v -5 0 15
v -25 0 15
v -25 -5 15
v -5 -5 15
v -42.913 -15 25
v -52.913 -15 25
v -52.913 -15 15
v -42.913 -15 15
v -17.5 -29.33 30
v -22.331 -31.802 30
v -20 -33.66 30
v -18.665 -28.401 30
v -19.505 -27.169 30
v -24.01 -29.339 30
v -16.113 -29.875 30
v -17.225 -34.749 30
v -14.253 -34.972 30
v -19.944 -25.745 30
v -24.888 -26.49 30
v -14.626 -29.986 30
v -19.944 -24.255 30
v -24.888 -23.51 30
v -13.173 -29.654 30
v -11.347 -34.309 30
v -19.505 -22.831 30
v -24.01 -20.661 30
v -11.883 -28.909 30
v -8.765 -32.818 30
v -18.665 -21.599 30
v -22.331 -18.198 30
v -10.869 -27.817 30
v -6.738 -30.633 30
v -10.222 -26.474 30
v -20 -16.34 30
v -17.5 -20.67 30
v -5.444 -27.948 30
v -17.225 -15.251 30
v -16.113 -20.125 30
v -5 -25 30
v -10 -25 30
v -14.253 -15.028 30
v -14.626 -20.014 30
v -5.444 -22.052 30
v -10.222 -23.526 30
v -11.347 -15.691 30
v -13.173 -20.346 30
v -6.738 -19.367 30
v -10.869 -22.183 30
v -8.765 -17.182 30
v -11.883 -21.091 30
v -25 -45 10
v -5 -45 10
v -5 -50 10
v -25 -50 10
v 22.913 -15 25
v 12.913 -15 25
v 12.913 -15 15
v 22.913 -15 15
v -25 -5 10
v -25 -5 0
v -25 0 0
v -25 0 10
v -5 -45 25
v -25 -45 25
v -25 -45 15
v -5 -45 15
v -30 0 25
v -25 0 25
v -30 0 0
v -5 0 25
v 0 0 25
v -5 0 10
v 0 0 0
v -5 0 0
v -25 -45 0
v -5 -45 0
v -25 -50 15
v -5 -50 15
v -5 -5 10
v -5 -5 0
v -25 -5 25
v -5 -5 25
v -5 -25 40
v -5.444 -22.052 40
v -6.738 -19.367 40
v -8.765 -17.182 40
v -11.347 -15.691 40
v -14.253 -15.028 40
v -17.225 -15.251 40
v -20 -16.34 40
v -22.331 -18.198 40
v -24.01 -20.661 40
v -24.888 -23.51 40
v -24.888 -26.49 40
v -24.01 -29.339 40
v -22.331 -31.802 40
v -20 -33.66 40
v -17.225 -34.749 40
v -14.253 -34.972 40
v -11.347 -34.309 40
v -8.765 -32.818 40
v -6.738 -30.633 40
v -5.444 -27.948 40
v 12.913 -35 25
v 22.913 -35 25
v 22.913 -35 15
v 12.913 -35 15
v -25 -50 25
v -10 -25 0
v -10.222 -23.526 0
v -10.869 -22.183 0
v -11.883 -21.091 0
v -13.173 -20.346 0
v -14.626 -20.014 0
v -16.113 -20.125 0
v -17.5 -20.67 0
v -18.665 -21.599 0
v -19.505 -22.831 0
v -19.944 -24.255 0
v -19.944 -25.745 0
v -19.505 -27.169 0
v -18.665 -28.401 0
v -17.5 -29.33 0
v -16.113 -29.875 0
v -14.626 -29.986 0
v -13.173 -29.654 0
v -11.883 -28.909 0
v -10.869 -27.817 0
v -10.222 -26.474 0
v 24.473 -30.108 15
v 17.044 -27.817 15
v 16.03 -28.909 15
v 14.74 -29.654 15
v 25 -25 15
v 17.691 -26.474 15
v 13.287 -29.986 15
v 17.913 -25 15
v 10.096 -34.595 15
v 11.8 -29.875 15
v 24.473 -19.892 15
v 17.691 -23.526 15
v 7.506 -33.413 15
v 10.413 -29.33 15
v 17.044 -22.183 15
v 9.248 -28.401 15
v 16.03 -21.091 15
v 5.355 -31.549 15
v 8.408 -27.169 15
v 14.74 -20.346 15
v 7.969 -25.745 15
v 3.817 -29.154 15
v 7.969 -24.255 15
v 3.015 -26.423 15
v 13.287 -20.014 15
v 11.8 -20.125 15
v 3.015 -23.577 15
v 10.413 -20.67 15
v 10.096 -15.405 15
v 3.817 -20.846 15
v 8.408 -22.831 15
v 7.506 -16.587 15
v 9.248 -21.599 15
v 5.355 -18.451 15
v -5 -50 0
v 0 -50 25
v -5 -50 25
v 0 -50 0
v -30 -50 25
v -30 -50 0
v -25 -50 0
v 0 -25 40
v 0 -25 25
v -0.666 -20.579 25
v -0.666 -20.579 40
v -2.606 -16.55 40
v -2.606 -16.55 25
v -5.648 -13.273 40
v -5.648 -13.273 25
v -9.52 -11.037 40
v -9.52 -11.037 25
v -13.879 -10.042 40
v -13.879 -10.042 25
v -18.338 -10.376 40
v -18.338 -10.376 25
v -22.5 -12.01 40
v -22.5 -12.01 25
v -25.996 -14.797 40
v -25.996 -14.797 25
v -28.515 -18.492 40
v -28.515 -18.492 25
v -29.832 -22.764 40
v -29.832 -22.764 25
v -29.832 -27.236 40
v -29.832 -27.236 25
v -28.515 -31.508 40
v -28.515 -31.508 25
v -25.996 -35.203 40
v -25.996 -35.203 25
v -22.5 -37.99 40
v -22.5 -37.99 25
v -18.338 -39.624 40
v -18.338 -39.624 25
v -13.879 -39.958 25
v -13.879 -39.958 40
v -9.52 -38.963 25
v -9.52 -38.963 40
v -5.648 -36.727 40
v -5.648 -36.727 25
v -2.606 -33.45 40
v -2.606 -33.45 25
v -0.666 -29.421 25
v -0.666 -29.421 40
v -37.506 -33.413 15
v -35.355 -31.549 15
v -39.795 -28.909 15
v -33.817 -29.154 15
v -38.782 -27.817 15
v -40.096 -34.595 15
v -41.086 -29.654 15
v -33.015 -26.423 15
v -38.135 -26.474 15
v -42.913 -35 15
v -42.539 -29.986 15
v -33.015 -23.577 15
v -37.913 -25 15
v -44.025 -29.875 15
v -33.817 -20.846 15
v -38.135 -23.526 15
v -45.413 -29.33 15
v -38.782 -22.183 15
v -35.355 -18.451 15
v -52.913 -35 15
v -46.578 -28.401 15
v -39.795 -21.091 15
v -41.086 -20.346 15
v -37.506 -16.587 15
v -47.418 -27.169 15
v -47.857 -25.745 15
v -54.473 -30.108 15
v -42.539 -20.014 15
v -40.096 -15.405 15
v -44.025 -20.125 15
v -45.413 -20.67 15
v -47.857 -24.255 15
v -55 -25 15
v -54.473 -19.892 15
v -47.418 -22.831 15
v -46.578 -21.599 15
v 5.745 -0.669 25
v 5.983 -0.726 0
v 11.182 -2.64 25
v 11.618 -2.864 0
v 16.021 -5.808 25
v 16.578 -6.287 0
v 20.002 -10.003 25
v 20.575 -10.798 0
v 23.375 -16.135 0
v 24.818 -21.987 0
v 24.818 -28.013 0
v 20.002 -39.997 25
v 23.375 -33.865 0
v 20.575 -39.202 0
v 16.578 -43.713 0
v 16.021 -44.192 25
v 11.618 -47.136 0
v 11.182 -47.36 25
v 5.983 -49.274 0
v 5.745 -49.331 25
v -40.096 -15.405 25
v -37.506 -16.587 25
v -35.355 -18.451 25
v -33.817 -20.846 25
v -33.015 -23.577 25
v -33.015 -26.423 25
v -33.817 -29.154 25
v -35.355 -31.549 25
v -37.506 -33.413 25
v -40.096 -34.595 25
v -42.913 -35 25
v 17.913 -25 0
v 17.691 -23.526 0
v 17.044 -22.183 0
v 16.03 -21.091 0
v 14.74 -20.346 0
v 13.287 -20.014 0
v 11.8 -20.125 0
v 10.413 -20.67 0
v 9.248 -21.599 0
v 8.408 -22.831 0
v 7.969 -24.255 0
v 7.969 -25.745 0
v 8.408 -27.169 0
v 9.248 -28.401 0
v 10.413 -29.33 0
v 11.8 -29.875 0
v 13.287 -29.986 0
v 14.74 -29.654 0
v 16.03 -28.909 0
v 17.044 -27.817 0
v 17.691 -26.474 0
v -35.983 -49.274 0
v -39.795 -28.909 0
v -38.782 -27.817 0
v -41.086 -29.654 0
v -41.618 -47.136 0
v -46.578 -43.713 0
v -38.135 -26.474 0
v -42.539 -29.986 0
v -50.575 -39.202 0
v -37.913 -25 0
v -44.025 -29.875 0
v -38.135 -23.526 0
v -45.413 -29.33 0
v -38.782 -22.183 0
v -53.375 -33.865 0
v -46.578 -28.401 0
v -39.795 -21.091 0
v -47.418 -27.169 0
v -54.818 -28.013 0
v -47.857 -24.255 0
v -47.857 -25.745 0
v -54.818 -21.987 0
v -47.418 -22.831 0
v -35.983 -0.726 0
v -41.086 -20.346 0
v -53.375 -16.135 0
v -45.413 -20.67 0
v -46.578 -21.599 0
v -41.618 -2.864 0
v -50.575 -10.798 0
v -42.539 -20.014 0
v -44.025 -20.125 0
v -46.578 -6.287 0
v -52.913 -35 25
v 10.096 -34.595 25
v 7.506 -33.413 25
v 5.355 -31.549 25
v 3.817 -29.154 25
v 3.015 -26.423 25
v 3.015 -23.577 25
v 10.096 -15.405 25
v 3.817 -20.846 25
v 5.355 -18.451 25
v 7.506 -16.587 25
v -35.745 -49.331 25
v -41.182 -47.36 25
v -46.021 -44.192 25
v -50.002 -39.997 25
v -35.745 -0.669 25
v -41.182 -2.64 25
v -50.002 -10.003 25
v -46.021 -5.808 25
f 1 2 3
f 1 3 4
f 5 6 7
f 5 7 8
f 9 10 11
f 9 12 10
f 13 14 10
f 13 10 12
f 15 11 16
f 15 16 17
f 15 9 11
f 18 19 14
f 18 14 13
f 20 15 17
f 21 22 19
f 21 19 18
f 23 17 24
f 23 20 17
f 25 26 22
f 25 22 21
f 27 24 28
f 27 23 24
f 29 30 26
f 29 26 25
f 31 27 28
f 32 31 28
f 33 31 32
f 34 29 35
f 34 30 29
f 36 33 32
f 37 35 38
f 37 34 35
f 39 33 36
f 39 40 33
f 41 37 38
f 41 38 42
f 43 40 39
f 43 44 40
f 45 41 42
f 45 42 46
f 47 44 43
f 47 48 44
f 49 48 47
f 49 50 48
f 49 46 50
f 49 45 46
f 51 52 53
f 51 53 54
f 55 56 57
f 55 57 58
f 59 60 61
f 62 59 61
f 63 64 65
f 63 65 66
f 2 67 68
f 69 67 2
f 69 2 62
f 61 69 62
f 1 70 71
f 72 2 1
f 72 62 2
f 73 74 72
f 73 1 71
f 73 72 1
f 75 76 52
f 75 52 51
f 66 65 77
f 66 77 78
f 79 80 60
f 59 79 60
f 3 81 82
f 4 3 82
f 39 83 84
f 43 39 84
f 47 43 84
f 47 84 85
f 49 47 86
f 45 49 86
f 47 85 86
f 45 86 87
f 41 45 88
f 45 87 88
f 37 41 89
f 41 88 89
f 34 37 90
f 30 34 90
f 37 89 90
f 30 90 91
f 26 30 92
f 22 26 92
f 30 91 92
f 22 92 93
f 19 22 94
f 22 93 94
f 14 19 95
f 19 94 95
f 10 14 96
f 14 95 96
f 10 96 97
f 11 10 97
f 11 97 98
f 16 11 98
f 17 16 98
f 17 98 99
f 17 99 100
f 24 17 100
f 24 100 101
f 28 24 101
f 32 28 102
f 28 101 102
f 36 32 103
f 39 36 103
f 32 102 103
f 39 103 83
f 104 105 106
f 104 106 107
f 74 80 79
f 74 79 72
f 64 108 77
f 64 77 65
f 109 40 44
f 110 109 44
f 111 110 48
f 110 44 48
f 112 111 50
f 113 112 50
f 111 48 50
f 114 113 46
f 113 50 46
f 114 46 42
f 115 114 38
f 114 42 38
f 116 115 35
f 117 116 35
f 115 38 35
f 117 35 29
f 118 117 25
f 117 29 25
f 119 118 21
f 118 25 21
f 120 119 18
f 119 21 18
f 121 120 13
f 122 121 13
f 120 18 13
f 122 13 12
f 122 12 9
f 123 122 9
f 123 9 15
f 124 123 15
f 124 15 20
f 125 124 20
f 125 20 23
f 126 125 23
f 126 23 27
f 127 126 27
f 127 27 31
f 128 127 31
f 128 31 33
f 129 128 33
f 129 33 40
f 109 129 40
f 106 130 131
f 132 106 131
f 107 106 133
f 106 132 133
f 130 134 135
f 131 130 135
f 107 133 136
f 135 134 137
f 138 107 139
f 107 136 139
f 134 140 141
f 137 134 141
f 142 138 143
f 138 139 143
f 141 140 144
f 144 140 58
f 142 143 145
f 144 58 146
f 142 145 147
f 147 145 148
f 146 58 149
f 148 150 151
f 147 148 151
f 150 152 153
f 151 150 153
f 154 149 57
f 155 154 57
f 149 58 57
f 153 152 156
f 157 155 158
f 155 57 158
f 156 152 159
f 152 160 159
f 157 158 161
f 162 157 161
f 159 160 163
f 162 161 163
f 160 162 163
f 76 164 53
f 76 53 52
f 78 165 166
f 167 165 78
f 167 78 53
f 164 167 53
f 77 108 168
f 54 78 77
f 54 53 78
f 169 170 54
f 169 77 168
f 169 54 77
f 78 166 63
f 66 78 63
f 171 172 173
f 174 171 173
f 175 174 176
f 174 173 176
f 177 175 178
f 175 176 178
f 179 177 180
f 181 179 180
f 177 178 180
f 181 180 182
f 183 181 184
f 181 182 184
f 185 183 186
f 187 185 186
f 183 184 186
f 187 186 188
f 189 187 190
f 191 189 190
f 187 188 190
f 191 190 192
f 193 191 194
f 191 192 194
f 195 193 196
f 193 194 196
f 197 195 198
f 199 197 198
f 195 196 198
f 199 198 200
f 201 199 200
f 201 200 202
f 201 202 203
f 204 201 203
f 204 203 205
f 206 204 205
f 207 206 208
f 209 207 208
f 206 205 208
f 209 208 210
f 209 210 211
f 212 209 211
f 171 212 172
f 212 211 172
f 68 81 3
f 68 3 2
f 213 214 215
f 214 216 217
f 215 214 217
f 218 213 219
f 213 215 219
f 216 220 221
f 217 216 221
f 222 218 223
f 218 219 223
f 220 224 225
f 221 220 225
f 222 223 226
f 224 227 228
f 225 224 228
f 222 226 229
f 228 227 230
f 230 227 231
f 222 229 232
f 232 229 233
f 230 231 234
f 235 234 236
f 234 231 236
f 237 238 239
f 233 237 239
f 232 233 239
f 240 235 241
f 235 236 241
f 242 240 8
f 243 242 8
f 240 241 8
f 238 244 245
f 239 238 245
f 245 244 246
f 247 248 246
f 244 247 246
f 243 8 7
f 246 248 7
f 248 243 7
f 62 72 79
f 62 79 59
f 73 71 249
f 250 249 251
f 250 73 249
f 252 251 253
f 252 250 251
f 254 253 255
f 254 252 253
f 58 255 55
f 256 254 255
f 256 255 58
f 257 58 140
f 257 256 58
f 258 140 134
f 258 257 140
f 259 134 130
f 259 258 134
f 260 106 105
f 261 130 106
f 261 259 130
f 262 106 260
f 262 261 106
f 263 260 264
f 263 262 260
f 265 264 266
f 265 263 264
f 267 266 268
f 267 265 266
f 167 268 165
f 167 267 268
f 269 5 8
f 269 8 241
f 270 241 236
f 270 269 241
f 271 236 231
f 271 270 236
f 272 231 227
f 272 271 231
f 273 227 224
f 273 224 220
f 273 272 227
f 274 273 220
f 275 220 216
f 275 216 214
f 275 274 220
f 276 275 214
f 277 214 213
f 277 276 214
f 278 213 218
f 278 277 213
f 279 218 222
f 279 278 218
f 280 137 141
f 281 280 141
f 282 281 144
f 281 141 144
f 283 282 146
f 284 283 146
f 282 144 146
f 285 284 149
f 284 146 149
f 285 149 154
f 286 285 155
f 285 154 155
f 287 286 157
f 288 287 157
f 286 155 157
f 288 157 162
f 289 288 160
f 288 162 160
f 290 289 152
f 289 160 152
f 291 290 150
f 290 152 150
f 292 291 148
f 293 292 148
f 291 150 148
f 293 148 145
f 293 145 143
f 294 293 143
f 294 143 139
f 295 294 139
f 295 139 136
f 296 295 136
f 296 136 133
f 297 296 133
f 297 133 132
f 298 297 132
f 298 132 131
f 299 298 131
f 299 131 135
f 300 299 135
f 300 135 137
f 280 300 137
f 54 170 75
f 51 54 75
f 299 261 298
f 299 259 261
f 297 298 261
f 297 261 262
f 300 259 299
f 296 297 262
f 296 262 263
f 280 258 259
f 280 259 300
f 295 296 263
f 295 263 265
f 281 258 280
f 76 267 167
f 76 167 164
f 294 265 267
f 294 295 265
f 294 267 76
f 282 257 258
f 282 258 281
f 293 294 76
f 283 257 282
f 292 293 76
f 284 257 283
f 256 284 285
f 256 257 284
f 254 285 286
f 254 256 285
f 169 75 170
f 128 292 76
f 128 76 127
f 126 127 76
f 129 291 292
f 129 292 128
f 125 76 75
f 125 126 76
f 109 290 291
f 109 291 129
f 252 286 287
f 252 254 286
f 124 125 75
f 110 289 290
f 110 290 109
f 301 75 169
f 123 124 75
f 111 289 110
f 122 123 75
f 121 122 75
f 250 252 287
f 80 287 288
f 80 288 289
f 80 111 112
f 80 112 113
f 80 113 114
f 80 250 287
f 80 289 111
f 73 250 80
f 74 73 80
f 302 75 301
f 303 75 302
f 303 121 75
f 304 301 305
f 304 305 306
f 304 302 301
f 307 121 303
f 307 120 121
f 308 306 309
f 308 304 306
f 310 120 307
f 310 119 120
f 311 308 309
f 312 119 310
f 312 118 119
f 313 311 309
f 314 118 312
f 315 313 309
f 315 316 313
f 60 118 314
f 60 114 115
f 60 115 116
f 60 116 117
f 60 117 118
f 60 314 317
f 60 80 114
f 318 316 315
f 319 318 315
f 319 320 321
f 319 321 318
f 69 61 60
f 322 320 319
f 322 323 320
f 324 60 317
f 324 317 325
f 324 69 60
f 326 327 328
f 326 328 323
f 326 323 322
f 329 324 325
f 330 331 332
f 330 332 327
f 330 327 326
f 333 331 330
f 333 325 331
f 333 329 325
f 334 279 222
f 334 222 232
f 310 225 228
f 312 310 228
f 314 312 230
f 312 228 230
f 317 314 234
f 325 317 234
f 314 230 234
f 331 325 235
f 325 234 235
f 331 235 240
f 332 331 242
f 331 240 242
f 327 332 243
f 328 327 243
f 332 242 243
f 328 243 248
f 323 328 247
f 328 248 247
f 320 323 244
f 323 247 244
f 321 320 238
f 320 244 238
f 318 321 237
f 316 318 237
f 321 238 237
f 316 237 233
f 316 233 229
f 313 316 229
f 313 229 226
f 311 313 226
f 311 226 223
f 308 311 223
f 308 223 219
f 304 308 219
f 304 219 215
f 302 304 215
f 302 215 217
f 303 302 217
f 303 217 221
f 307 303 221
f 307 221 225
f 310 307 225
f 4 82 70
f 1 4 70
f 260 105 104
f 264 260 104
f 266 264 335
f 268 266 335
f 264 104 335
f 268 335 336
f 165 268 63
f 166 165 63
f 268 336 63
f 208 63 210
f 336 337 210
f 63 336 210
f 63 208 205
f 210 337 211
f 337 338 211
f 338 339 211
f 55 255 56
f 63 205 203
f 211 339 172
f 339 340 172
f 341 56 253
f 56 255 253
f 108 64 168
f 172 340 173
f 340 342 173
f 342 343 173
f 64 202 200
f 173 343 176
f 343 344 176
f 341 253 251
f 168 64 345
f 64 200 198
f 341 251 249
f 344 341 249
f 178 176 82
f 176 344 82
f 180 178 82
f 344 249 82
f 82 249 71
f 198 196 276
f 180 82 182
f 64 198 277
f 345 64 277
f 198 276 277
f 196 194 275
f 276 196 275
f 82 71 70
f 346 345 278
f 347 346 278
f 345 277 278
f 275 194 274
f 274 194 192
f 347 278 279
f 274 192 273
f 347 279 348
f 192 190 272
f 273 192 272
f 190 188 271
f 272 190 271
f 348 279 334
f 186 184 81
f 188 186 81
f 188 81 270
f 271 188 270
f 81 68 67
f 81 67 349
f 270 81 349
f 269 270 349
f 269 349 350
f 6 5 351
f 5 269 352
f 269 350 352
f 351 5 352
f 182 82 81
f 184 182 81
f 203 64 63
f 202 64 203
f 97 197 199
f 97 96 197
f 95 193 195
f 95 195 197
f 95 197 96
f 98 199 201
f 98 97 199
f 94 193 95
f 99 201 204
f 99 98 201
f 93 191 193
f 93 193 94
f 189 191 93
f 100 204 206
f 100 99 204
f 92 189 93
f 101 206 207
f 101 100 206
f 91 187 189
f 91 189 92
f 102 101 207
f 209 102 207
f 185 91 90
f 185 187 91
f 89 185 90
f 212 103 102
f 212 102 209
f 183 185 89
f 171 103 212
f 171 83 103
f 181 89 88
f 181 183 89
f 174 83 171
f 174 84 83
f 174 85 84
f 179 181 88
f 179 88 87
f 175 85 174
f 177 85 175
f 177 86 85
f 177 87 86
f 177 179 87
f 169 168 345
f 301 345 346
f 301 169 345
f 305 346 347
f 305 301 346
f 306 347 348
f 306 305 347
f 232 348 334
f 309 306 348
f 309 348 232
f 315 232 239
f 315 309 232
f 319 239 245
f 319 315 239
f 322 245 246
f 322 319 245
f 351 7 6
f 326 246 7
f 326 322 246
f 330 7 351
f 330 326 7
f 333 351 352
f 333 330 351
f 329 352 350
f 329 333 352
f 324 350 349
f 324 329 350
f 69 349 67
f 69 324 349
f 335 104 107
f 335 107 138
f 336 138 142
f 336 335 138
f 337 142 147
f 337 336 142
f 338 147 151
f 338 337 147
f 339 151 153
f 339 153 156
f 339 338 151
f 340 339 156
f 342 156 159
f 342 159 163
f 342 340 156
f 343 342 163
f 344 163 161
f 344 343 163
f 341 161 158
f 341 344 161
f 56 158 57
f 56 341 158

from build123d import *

# Parameters (mm, degrees)
BOSS_EXTRUDE2_DEPTH = 25
SKETCH2_W           = 20
SKETCH2_H           = 5
CUT_EXTRUDE2_DEPTH  = 10
SKETCH3_W           = 20
SKETCH3_H           = 5
CUT_EXTRUDE3_DEPTH  = 10
SKETCH4_R           = 15
BOSS_EXTRUDE3_DEPTH = 15
SKETCH5_R           = 10
CUT_EXTRUDE4_DEPTH  = 10
SKETCH6_R           = 5
CUT_EXTRUDE9_DEPTH  = 300
CUT_EXTRUDE10_DEPTH = 10
SKETCH9_R           = 5
CUT_EXTRUDE11_DEPTH = 70


with BuildPart() as part:
    # Sketch1 → Boss-Extrude2 (new body)
    with BuildSketch(Plane.XY):
        with BuildLine():
            Line((-30, 0), (0, 0))
            ThreePointArc((0, 0), (25, -25), (0, -50))
            Line((0, -50), (-30, -50))
            ThreePointArc((-30, -50), (-55, -25), (-30, 0))
        make_face()
    extrude(amount=BOSS_EXTRUDE2_DEPTH)

    # Sketch2 → Cut-Extrude2 (cut)
    with BuildSketch(Plane.XY.offset(25)):
        with Locations((-15, -2.5)):
            Rectangle(SKETCH2_W, SKETCH2_H)
        with Locations((-15, -47.5)):
            Rectangle(SKETCH2_W, SKETCH2_H)
    extrude(amount=-CUT_EXTRUDE2_DEPTH, mode=Mode.SUBTRACT)

    # Sketch3 → Cut-Extrude3 (cut)
    with BuildSketch(Plane(origin=(0, 0, 0), x_dir=(-1, 0, 0), z_dir=(0, 0, -1))):
        with Locations((15, -2.5)):
            Rectangle(SKETCH3_W, SKETCH3_H)
        with Locations((15, -47.5)):
            Rectangle(SKETCH3_W, SKETCH3_H)
    extrude(amount=-CUT_EXTRUDE3_DEPTH, mode=Mode.SUBTRACT)

    # Sketch4 → Boss-Extrude3 (add)
    with BuildSketch(Plane.XY.offset(25)):
        with Locations((-15, -25)):
            Circle(SKETCH4_R)
    extrude(amount=BOSS_EXTRUDE3_DEPTH)

    # Sketch5 → Cut-Extrude4 (cut)
    with BuildSketch(Plane.XY.offset(40)):
        with Locations((-15, -25)):
            Circle(SKETCH5_R)
    extrude(amount=-CUT_EXTRUDE4_DEPTH, mode=Mode.SUBTRACT)

    # Sketch6 → Cut-Extrude9 (cut)
    with BuildSketch(Plane.XY.offset(30)):
        with Locations((-15, -25)):
            Circle(SKETCH6_R)
    extrude(amount=-CUT_EXTRUDE9_DEPTH, mode=Mode.SUBTRACT)

    # Sketch8 → Cut-Extrude10 (cut)
    with BuildSketch(Plane.XY.offset(25)):
        with BuildLine():
            Line((22.912878475, -35), (12.912878475, -35))
            ThreePointArc((12.912878475, -35), (2.912878475, -25), (12.912878475, -15))
            Line((12.912878475, -15), (22.912878475, -15))
            ThreePointArc((22.912878475, -15), (25, -25), (22.912878475, -35))
        make_face()
        with BuildLine():
            Line((-52.912878475, -15), (-42.912878475, -15))
            ThreePointArc((-42.912878475, -15), (-32.912878475, -25), (-42.912878475, -35))
            Line((-42.912878475, -35), (-52.912878475, -35))
            ThreePointArc((-52.912878475, -35), (-55, -25), (-52.912878475, -15))
        make_face()
    extrude(amount=-CUT_EXTRUDE10_DEPTH, mode=Mode.SUBTRACT)

    # Sketch9 → Cut-Extrude11 (cut)
    with BuildSketch(Plane.XY.offset(15)):
        with Locations((-42.912878475, -25)):
            Circle(SKETCH9_R)
        with Locations((12.912878475, -25)):
            Circle(SKETCH9_R)
    extrude(amount=-CUT_EXTRUDE11_DEPTH, mode=Mode.SUBTRACT)


solid = part.part
